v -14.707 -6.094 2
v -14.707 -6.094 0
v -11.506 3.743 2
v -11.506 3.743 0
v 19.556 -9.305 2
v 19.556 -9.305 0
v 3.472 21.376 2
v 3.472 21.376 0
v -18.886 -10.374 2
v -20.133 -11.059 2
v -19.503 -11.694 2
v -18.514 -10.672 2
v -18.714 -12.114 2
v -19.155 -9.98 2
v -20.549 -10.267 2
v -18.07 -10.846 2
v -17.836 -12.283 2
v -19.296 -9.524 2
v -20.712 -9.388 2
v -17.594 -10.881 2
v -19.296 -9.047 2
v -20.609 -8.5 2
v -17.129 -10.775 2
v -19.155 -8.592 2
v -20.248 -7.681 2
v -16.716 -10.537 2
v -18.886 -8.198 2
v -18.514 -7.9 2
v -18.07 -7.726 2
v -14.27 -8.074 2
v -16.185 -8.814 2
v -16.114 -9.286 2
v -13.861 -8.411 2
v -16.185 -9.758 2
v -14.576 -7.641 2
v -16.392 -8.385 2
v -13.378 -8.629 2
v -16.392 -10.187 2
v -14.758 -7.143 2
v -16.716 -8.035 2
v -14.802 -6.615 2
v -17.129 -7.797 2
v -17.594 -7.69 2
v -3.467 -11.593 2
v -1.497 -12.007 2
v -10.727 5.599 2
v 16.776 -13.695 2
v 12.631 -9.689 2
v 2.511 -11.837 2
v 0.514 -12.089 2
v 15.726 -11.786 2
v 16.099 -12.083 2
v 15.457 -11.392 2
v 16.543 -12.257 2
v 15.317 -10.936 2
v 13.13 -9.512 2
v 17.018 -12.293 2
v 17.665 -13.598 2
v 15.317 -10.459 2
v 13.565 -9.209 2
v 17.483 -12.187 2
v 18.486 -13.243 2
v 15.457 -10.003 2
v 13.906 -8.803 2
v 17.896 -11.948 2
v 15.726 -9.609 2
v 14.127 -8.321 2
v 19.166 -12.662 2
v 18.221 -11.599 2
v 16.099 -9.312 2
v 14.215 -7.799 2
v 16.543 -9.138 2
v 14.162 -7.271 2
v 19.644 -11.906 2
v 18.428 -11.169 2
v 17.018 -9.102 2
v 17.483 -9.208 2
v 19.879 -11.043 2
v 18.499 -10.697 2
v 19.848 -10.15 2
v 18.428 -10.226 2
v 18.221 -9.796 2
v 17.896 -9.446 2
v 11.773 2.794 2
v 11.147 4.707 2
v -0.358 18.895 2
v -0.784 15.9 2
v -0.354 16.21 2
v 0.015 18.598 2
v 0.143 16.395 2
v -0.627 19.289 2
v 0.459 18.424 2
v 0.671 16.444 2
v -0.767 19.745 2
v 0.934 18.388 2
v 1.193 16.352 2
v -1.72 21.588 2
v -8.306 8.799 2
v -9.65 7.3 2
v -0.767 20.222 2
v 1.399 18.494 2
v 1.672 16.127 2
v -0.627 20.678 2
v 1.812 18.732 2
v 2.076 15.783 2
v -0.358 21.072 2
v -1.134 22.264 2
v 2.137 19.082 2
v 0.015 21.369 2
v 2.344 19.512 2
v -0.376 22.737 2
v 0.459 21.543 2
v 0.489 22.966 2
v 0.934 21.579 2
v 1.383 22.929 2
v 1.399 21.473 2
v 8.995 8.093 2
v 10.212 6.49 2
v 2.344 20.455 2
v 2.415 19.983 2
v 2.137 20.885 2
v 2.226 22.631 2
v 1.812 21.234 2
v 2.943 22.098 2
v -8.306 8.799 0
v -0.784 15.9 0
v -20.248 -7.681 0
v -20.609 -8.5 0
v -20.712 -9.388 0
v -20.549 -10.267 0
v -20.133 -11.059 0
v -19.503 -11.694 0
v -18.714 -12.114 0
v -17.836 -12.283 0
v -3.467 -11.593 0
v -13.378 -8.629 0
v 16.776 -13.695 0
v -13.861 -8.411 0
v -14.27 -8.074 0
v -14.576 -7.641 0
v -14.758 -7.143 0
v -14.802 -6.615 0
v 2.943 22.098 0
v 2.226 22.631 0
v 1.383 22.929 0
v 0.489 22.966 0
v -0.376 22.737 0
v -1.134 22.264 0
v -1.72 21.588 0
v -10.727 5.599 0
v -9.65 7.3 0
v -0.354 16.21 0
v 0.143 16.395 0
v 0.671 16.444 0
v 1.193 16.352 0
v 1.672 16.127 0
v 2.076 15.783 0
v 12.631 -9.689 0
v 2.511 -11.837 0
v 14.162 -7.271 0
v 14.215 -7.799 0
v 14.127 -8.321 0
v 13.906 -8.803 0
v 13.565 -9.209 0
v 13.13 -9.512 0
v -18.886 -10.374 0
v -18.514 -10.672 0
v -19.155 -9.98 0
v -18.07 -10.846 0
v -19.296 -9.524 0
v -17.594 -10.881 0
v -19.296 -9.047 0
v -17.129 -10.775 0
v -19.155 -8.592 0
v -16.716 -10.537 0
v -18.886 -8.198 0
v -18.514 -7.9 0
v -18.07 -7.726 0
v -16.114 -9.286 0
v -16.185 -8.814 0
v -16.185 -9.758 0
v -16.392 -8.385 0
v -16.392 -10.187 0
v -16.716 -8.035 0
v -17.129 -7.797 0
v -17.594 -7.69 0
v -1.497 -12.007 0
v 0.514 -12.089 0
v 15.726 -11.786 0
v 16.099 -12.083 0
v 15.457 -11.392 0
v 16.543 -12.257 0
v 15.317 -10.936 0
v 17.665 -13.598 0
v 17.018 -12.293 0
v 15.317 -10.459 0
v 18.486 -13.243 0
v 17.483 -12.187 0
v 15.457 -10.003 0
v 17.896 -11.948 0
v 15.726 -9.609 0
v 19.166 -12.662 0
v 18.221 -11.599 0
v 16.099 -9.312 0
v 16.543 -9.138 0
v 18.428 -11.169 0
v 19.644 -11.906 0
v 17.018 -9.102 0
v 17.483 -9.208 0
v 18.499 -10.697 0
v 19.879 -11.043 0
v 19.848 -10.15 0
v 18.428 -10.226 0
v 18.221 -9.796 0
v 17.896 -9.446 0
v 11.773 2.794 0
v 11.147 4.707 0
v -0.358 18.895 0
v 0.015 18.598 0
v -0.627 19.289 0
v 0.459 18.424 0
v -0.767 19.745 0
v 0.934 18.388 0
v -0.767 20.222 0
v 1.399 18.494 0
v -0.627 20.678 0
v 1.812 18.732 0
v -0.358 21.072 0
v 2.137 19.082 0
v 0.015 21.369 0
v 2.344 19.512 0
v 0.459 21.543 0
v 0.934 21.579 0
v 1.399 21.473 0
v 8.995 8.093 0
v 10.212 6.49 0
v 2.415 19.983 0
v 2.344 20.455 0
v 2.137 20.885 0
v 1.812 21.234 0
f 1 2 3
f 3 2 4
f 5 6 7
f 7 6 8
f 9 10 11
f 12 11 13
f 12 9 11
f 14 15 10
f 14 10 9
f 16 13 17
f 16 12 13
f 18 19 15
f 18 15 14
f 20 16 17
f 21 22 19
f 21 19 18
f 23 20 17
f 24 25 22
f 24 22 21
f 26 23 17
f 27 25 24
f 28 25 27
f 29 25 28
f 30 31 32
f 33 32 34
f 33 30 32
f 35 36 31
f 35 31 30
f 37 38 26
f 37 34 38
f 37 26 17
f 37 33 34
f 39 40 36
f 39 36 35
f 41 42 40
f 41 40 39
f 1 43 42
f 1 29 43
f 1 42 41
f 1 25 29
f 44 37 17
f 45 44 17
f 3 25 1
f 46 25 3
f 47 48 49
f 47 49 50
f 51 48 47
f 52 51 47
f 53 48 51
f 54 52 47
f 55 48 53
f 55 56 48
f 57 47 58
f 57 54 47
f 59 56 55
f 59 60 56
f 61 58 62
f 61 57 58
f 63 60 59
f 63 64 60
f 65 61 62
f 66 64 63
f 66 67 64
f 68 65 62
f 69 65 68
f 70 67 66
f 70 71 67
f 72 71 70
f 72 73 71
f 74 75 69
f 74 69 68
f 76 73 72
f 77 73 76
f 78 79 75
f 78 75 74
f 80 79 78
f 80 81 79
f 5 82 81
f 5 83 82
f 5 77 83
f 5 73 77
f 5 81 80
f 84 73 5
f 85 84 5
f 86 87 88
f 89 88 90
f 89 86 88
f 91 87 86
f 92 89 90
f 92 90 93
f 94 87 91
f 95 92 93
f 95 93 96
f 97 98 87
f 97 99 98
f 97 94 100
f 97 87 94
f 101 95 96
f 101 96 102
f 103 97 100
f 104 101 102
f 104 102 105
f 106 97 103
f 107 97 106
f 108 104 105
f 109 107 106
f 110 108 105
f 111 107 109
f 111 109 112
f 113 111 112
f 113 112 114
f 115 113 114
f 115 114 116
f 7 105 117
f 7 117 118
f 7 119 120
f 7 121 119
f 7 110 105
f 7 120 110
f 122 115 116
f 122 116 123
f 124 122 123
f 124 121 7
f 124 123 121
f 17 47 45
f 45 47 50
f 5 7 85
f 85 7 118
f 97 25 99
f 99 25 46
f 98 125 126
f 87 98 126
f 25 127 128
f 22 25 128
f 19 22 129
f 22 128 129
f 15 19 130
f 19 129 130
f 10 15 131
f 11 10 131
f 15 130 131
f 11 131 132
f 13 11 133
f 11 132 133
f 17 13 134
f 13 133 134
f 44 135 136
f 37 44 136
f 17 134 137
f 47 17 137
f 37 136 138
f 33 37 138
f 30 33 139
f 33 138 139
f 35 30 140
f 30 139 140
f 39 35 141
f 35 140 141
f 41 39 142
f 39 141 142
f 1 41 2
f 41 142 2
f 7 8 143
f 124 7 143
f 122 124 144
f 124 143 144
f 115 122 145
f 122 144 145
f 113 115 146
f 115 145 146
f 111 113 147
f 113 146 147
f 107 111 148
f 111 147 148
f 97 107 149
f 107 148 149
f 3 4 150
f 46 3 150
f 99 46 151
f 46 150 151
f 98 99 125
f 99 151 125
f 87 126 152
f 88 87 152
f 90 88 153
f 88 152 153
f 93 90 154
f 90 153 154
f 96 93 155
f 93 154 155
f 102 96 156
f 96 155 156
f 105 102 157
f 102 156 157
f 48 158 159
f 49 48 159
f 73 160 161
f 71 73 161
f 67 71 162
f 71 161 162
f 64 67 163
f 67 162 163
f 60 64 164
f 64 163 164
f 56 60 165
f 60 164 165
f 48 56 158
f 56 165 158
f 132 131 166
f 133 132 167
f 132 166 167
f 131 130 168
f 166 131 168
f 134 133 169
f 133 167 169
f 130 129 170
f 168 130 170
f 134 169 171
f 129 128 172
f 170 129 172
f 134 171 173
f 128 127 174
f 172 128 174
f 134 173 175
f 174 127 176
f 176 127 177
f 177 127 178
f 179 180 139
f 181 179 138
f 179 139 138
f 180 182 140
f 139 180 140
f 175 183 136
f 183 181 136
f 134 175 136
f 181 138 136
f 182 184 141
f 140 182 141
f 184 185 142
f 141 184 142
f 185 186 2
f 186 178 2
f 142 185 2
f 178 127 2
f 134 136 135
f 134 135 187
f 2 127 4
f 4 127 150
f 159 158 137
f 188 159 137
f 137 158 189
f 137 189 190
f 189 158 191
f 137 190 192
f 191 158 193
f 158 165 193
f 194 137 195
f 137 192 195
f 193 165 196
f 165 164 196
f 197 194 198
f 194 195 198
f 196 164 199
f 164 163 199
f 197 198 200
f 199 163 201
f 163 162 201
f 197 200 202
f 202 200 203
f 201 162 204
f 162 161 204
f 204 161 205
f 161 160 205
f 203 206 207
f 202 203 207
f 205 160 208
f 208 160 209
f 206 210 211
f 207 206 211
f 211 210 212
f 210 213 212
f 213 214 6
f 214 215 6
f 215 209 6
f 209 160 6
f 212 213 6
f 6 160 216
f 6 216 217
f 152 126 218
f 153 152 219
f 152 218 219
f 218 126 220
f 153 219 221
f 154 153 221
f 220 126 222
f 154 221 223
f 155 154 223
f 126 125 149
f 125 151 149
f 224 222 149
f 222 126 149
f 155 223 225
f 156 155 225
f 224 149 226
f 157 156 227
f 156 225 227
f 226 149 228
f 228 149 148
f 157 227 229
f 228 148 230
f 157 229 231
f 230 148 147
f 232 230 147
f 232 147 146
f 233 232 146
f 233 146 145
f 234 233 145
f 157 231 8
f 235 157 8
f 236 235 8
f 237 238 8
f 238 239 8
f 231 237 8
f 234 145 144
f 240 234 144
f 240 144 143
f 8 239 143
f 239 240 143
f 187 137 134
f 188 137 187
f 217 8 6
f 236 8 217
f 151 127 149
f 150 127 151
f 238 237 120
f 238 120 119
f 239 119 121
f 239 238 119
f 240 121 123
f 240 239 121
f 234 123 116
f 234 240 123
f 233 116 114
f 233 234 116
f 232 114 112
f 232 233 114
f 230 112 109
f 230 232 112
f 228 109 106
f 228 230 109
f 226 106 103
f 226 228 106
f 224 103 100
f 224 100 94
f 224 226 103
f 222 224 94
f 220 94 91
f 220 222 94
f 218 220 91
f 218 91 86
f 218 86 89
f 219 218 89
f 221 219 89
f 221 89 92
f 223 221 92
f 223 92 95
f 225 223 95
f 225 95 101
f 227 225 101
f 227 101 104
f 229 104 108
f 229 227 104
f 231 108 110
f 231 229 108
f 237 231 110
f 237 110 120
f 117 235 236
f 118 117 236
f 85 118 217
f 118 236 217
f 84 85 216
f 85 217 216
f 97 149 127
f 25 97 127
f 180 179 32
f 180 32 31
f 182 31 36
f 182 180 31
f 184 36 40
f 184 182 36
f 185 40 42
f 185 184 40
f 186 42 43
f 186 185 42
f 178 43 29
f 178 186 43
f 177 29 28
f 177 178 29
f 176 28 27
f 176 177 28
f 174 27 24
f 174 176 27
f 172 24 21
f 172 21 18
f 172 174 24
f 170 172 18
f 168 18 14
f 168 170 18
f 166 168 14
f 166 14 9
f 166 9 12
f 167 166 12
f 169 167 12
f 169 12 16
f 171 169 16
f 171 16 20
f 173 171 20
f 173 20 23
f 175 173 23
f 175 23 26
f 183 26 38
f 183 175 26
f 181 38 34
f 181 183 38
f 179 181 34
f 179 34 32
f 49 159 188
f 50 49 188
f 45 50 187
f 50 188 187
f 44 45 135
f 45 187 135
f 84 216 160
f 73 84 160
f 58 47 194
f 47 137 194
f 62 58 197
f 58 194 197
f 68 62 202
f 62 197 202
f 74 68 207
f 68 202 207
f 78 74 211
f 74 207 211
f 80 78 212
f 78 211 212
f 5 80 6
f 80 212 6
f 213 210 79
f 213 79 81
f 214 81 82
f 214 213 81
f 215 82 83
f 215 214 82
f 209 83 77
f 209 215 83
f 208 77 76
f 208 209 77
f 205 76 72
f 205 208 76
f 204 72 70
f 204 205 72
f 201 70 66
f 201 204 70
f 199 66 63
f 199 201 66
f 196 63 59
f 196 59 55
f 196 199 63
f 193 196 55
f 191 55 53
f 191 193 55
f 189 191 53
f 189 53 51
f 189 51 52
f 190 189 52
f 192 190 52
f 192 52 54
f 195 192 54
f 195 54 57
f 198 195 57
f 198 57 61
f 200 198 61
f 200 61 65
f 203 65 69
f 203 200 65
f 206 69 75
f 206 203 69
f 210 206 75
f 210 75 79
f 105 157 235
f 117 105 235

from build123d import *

# Parameters (mm, degrees)
SKETCH1_R           = 3
SKETCH1_R_2         = 1.6
BOSS_EXTRUDE1_DEPTH = 2


with BuildPart() as part:
    # Sketch1 → Boss-Extrude1 (new body)
    # profile 1 of 4: a face of its own
    with BuildSketch(Plane.XY):
        with BuildLine():
            ThreePointArc((3.814909487, 19.983391167), (-0.020434351, 17.102037202), (-1.719890963, 21.588005352))
            Line((-1.719890963, 21.588005352), (-20.248379597, -7.681349081))
            ThreePointArc((-20.248379597, -7.681349081), (-16.87823531, -6.404609301), (-14.713579148, -9.285963266))
            ThreePointArc((-14.713579148, -9.285963266), (-15.635925335, -11.450069233), (-17.835815571, -12.283471941))
            Line((-17.835815571, -12.283471941), (16.776433238, -13.694936576))
            ThreePointArc((16.776433238, -13.694936576), (14.363869212, -9.092813716), (19.555706533, -9.304533411))
            Line((19.555706533, -9.304533411), (3.471946359, 21.376285657))
            ThreePointArc((3.471946359, 21.376285657), (3.727907136, 20.700639166), (3.814909487, 19.983391167))
        make_face()
        with BuildLine():
            Line((-8.306162696, 8.798730663), (-0.783837106, 15.899943621))
            ThreePointArc((-0.783837106, 15.899943621), (0.670573296, 16.443947091), (2.075859948, 15.783327064))
            Line((2.075859948, 15.783327064), (8.995004486, 8.093200498))
            ThreePointArc((8.995004486, 8.093200498), (10.716715384, 5.618007776), (11.773005623, 2.793982571))
            Line((11.773005623, 2.793982571), (14.161673647, -7.271148964))
            ThreePointArc((14.161673647, -7.271148964), (13.905589271, -8.802707055), (12.63083222, -9.689410982))
            Line((12.63083222, -9.689410982), (2.511414986, -11.836502641))
            ThreePointArc((2.511414986, -11.836502641), (-0.493020239, -12.089951656), (-3.466842927, -11.592713234))
            Line((-3.466842927, -11.592713234), (-13.377836541, -8.628794657))
            ThreePointArc((-13.377836541, -8.628794657), (-14.576162567, -7.641240036), (-14.706692168, -6.093916082))
            Line((-14.706692168, -6.093916082), (-11.506419472, 3.743302143))
            ThreePointArc((-11.506419472, 3.743302143), (-10.223695145, 6.47194388), (-8.306162696, 8.798730663))
        make_face(mode=Mode.SUBTRACT)
    # profile 2 of 4: a face of its own
    with BuildSketch(Plane.XY):
        with Locations((0.814909487, 19.983391167)):
            Circle(SKETCH1_R)
        with Locations((0.814909487, 19.983391167)):
            Circle(SKETCH1_R_2, mode=Mode.SUBTRACT)
    # profile 3 of 4: a face of its own
    with BuildSketch(Plane.XY):
        with Locations((16.898669661, -10.697427901)):
            Circle(SKETCH1_R)
        with Locations((16.898669661, -10.697427901)):
            Circle(SKETCH1_R_2, mode=Mode.SUBTRACT)
    # profile 4 of 4: a face of its own
    with BuildSketch(Plane.XY):
        with Locations((-17.713579148, -9.285963266)):
            Circle(SKETCH1_R)
        with Locations((-17.713579148, -9.285963266)):
            Circle(SKETCH1_R_2, mode=Mode.SUBTRACT)
    extrude(amount=BOSS_EXTRUDE1_DEPTH)


solid = part.part
